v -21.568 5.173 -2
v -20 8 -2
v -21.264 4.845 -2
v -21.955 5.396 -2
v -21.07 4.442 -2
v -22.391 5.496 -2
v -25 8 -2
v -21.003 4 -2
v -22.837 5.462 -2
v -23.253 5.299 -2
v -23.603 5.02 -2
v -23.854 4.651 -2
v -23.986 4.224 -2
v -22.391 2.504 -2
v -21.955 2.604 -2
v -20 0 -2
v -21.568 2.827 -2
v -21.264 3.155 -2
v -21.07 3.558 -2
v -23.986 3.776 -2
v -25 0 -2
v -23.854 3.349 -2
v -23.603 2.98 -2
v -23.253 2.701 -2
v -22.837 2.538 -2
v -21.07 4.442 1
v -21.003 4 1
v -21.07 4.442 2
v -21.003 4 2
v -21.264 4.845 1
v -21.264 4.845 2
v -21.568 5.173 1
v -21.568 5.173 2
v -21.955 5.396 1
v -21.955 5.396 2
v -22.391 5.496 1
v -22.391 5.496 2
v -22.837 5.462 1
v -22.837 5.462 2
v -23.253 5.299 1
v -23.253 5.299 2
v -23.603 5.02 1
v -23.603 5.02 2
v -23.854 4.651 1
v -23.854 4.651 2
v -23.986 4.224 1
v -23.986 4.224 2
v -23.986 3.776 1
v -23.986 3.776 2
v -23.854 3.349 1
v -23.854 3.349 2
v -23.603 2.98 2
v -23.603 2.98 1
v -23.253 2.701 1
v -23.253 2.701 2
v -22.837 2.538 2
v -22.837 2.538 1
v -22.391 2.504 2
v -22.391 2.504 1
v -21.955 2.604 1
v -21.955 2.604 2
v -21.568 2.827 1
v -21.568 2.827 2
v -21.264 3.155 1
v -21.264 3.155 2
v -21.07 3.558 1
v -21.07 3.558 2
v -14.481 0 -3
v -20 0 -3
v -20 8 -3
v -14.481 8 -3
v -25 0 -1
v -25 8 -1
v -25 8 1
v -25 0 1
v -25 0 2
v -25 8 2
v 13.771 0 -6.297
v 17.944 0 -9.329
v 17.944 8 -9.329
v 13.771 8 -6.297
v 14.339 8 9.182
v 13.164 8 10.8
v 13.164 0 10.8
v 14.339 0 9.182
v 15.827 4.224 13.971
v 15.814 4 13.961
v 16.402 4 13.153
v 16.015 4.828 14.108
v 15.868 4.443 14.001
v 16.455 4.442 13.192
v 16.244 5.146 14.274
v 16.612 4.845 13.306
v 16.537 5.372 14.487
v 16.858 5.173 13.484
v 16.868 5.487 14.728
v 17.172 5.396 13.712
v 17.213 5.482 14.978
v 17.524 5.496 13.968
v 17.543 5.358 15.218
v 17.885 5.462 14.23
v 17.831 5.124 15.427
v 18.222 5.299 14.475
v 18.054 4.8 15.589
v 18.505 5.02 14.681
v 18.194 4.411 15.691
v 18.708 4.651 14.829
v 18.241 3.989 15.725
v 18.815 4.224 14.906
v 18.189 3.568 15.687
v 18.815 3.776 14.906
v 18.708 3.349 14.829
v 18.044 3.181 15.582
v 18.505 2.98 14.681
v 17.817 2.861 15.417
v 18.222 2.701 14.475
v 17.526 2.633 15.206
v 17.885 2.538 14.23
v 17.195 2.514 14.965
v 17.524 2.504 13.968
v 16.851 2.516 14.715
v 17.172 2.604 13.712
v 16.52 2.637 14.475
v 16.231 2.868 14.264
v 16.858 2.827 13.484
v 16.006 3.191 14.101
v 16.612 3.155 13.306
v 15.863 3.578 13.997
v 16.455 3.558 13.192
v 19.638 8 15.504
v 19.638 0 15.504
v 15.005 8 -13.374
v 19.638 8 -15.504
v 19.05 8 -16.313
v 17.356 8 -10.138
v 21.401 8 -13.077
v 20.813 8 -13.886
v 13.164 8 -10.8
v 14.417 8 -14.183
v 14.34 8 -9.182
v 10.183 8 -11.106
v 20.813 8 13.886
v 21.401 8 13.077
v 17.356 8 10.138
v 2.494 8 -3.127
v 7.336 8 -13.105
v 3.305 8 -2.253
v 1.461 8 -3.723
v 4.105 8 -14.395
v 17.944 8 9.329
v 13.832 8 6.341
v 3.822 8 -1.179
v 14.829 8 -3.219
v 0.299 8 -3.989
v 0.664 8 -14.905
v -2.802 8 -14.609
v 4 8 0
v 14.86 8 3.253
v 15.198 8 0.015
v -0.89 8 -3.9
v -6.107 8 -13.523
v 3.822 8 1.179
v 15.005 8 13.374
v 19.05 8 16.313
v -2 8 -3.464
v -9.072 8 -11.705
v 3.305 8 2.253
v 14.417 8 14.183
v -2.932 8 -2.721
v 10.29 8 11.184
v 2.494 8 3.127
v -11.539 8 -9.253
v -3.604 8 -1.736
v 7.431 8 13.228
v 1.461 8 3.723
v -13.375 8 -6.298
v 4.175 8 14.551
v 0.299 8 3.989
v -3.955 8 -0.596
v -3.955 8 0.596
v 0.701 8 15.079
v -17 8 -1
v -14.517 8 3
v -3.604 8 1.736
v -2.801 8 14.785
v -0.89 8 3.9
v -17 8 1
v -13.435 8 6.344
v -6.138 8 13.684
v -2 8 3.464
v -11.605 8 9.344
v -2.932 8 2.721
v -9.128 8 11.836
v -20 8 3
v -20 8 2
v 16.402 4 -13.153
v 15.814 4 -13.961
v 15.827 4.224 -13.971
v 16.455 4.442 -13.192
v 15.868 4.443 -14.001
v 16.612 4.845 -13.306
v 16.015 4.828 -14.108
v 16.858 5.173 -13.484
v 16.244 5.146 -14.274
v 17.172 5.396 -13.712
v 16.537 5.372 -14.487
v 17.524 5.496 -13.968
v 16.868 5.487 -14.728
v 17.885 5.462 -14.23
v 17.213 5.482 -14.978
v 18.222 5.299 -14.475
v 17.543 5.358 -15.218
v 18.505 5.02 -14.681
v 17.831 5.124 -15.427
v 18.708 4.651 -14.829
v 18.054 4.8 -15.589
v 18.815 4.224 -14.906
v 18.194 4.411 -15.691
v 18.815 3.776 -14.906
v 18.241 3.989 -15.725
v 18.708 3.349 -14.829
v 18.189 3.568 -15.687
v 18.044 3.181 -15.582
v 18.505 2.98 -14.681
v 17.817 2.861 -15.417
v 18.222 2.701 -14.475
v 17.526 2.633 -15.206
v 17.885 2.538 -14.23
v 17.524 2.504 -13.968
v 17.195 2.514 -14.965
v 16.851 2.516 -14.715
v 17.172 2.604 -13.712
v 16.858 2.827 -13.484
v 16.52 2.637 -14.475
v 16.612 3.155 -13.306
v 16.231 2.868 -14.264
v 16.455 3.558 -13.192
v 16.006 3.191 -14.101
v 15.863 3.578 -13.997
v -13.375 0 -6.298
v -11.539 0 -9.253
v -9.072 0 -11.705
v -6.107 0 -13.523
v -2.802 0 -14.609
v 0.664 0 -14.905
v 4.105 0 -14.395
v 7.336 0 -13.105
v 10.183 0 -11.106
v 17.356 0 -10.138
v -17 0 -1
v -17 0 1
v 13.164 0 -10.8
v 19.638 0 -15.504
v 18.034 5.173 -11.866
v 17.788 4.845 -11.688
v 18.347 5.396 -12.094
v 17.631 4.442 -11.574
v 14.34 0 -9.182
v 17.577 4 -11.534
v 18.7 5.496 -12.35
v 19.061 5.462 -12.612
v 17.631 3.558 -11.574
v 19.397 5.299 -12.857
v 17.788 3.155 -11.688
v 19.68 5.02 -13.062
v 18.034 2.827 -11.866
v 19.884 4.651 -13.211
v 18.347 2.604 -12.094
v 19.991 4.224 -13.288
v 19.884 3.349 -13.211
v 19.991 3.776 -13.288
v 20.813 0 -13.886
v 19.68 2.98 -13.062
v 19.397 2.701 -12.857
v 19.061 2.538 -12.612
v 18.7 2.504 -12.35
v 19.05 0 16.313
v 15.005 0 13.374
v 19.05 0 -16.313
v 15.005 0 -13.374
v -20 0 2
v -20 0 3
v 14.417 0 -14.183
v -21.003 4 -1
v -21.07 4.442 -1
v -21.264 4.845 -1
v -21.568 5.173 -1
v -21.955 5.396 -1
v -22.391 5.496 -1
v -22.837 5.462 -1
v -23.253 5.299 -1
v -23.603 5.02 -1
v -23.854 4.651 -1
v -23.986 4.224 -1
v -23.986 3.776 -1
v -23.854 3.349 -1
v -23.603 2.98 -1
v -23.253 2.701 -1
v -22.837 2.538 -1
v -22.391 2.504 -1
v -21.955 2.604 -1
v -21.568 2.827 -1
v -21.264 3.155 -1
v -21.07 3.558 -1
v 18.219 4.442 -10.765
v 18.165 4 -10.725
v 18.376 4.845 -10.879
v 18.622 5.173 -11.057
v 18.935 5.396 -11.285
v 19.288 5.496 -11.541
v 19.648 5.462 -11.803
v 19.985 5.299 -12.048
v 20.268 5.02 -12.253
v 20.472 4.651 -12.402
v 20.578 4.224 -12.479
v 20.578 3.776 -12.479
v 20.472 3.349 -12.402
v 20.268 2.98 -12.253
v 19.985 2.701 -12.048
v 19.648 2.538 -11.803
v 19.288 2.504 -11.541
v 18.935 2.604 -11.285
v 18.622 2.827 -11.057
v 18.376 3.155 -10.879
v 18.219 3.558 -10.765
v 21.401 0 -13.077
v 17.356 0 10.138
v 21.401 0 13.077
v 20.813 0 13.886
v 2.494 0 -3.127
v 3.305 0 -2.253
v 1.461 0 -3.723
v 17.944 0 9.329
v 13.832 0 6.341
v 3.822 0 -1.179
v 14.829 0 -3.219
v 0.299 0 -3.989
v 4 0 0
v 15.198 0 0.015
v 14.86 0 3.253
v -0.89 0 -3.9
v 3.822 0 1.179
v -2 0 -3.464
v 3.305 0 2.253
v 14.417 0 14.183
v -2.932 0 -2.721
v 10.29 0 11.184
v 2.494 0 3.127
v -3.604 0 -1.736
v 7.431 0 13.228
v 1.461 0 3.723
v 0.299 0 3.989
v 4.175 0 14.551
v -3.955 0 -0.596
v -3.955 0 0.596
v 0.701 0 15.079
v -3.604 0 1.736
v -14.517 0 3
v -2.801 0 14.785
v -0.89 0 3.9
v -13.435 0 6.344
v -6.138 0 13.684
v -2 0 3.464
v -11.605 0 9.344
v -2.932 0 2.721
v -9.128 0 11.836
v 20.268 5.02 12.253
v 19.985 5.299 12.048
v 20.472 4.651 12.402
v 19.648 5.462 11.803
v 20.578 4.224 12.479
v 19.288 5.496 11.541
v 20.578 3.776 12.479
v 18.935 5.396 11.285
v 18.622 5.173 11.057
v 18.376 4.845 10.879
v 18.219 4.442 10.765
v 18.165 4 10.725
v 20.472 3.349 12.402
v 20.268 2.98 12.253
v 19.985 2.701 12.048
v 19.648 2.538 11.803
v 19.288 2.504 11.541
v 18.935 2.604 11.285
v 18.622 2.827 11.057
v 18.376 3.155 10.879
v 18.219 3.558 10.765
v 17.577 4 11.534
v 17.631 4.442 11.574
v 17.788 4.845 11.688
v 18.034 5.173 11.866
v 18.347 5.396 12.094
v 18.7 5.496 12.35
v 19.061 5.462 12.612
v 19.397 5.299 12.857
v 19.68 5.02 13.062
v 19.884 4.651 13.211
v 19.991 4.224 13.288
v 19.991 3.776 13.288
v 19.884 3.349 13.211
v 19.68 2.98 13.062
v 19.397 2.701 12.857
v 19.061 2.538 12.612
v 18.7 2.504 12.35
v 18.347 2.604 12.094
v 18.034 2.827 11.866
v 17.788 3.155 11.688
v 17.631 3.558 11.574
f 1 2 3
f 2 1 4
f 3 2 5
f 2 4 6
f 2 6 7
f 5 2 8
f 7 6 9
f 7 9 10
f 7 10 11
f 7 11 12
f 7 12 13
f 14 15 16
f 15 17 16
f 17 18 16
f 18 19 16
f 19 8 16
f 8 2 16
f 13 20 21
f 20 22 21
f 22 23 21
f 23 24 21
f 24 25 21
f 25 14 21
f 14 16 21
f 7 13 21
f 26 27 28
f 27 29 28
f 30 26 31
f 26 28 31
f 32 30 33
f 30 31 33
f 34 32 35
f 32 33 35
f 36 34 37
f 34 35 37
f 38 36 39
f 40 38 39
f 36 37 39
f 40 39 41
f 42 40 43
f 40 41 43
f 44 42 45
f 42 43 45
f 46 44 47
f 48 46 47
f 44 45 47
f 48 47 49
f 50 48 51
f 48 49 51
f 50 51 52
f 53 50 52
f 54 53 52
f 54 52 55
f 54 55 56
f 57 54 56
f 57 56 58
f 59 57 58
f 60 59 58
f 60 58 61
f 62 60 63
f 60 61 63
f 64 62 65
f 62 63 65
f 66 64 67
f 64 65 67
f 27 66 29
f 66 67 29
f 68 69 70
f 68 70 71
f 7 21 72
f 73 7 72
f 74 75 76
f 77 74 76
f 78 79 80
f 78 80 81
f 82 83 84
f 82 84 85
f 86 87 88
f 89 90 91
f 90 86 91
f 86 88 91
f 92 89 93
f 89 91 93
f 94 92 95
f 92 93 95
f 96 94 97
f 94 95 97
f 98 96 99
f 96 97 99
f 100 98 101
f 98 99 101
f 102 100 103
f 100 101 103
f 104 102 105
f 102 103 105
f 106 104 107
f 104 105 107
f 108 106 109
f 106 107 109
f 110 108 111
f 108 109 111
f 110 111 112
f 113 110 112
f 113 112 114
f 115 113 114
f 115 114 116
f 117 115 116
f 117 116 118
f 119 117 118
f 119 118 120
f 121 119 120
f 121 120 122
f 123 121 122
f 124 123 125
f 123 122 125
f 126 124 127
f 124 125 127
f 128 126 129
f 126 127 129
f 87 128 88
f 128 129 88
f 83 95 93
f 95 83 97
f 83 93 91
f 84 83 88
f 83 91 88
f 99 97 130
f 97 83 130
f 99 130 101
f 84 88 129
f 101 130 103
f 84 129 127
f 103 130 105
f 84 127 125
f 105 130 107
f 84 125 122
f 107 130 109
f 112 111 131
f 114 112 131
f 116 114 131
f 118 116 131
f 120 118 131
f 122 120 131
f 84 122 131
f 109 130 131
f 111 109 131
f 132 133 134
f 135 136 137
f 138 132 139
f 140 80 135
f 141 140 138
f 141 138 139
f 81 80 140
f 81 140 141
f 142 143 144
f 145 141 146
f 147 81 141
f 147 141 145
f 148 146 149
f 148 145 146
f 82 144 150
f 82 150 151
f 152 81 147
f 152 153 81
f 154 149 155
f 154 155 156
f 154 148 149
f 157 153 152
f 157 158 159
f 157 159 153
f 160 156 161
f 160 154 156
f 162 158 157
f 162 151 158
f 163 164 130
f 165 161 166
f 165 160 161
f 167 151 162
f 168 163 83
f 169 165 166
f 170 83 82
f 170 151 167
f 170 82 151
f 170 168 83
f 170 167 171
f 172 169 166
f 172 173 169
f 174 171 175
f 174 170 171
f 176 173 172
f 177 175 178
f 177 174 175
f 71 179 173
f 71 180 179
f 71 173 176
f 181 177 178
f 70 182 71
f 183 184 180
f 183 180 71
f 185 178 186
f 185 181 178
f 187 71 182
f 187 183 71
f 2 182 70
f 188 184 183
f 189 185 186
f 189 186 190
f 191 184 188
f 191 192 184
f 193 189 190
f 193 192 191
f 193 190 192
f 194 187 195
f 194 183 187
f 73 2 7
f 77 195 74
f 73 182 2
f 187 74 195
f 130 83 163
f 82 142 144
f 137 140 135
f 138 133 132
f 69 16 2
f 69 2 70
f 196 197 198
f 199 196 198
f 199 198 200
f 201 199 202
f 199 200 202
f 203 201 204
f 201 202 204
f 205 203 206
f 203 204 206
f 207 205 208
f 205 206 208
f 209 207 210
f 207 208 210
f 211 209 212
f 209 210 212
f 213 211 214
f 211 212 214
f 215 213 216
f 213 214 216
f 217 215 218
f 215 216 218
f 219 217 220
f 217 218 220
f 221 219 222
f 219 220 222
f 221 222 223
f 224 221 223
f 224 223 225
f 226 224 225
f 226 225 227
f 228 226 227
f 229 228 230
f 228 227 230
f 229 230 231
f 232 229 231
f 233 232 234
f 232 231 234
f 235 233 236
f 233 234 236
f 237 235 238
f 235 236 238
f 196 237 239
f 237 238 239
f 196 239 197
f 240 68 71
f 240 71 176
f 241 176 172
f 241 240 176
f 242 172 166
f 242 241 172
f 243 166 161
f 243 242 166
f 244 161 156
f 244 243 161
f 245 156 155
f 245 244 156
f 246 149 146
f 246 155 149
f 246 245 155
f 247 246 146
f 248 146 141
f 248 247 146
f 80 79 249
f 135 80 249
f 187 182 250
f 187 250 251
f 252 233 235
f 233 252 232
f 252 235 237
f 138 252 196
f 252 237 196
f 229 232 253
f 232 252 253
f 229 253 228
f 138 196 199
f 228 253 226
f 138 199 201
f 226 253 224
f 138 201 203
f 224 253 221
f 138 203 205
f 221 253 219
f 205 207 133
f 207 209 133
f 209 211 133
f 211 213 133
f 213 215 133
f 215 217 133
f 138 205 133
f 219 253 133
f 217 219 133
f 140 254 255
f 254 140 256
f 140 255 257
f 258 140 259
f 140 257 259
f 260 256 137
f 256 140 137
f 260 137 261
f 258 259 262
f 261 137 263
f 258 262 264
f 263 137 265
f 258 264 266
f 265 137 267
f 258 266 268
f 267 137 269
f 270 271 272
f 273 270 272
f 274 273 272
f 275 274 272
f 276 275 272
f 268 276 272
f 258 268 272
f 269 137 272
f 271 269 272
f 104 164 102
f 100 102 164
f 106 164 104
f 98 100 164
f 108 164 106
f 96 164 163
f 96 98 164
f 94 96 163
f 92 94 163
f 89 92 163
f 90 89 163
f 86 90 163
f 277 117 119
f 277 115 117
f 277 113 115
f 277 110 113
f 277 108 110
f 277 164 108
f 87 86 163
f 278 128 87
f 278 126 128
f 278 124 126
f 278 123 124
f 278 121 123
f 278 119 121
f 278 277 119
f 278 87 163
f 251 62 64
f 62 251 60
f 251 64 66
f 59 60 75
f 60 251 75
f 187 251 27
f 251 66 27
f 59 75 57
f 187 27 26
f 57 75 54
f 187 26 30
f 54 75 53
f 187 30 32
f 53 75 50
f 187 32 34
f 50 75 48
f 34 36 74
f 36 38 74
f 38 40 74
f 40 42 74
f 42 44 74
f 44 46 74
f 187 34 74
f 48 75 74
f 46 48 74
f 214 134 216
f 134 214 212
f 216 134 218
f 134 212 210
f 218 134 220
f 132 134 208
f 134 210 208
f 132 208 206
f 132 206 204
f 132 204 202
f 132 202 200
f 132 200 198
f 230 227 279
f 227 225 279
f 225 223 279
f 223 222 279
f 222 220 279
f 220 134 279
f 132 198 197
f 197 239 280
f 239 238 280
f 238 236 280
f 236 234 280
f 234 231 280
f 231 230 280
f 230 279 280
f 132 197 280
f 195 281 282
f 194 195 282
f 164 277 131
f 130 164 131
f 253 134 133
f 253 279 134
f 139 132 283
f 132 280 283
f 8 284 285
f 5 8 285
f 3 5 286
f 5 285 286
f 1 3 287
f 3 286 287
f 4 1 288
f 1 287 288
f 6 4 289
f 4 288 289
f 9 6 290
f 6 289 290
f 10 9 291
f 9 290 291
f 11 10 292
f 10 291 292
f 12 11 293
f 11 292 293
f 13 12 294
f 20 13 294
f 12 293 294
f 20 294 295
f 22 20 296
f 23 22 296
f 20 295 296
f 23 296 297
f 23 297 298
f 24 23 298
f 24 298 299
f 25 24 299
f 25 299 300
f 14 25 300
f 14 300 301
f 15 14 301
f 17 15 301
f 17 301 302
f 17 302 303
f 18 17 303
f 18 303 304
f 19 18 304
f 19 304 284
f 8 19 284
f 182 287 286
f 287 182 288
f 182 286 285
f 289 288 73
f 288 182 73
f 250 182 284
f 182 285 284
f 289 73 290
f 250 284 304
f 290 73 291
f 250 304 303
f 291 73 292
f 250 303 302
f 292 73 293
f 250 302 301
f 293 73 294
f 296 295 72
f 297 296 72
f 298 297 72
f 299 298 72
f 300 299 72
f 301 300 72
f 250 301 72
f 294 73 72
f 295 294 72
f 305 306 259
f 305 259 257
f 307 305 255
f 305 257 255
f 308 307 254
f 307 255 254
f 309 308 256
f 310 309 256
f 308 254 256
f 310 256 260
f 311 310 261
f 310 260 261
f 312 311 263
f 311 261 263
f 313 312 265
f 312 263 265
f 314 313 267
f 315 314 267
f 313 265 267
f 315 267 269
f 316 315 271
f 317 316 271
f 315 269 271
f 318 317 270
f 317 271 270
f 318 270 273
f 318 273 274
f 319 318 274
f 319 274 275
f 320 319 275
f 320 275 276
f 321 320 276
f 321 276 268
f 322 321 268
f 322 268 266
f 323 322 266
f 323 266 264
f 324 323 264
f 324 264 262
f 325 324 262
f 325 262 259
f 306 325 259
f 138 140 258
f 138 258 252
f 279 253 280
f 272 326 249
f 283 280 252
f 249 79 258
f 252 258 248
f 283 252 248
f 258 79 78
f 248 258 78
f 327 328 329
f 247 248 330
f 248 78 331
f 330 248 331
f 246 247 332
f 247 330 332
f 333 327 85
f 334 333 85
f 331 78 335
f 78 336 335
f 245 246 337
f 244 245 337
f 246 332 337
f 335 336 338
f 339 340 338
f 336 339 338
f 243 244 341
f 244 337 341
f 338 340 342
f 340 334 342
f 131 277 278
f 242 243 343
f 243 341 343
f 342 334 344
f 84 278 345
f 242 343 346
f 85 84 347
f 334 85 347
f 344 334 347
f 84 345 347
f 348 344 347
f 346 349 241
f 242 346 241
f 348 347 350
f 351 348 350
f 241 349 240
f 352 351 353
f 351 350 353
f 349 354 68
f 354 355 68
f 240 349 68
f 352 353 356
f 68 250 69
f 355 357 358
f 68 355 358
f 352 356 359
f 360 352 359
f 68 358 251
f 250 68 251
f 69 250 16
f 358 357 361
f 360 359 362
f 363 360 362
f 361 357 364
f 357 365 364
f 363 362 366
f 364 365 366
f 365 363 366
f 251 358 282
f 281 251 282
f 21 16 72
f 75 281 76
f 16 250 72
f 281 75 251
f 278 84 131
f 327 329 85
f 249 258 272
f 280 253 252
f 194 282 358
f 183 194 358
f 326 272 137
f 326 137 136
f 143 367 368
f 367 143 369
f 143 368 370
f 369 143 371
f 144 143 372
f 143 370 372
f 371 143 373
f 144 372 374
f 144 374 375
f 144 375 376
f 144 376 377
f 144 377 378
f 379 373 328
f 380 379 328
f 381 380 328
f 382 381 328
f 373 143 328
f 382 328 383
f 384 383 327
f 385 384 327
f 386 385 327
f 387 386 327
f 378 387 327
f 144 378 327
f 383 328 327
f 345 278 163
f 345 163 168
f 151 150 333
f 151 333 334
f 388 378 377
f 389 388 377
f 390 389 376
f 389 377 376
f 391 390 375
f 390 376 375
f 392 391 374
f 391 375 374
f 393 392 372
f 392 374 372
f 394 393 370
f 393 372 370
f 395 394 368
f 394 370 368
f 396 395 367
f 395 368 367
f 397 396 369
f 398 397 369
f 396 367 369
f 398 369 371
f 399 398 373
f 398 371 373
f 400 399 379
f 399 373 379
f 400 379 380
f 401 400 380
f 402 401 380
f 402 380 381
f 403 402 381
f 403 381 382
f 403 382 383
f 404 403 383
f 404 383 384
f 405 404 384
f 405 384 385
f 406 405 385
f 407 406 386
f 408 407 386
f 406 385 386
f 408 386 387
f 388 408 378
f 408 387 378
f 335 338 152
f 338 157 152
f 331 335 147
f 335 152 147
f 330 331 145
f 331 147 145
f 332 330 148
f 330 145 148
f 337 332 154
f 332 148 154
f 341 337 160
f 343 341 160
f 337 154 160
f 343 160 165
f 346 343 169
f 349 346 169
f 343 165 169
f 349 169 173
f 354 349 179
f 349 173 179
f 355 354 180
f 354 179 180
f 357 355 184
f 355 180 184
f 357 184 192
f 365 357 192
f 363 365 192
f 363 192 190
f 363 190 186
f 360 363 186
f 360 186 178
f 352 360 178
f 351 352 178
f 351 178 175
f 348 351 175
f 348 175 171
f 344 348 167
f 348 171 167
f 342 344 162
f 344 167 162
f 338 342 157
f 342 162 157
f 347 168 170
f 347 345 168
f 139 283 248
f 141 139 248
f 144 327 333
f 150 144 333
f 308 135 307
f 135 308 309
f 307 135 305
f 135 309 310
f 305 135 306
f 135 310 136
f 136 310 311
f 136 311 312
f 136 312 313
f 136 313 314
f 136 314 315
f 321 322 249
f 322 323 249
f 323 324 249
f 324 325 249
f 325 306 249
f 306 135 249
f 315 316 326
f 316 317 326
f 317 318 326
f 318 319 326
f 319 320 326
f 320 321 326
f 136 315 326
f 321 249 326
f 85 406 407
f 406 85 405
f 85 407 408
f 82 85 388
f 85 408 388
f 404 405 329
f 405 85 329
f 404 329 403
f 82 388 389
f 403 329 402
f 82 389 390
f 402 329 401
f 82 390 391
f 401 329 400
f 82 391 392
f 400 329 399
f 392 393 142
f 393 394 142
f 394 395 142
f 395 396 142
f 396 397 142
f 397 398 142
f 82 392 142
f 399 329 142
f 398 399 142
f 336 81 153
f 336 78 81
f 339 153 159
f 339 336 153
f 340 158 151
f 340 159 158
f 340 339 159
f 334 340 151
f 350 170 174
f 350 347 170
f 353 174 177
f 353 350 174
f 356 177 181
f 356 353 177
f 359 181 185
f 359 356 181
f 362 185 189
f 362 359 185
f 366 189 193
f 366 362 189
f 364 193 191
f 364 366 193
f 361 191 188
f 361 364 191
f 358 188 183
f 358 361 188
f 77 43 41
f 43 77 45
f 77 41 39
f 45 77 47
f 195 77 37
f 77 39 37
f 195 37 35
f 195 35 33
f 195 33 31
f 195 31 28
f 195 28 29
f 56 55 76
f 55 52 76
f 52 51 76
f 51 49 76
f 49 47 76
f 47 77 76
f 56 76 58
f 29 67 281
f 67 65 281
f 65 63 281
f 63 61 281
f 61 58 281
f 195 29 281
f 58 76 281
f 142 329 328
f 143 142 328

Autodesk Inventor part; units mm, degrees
ref_plane "YZ Plane" through (0, 0, 0) normal (1, 0, 0) x (0, 1, 0)
ref_plane "XZ Plane" through (0, 0, 0) normal (0, 1, 0) x (-1, 0, 0)
ref_plane "XY Plane" through (0, 0, 0) normal (0, 0, 1) x (1, 0, 0)
sketch "Sketch1" plane through (0, 0, 0) normal (0, 1, 0) x (-1, 0, 0)
  circle A0 centre (-0.1978, 0.0875) radius 15
  line L0 (0, 0) -> (25, 0)
  line L1 (0, 0) -> (-20.2254, -14.6946)
  line L2 (0, 0) -> (25, 0) construction
  line L3 (0, 0) -> (-20.2254, 14.6946)
  line L4 (0, 0) -> (25, 0) construction
  line L5 (25, 0) -> (14.5167, 0)
  line L6 (25, 0) -> (14.481, 0)
  line L7 (25, 2) -> (20, 2)
  line L8 (20, 2) -> (20, -2)
  line L9 (20, -2) -> (25, -2)
  line L10 (20, -2) -> (20, -3)
  line L11 (20, 2) -> (20, 3)
  line L12 (25, -2) -> (25, 2)
  line L13 (20, 3) -> (14.5167, 3)
  line L14 (20, -3) -> (14.481, -3)
  line L15 (-21.401, 13.0766) -> (-17.3559, 10.1377)
  line L16 (-17.3559, 10.1377) -> (-17.9437, 9.3287)
  line L17 (-19.0499, 16.3127) -> (-15.0048, 13.3737)
  line L18 (-15.0048, 13.3737) -> (-14.417, 14.1828)
  line L19 (-19.0499, 16.3127) -> (-21.401, 13.0766)
  line L20 (-17.9437, 9.3287) -> (-13.832, 6.3413)
  line L21 (-14.417, 14.1828) -> (-10.2902, 11.1845)
  line L22 (-19.0499, -16.3127) -> (-15.0048, -13.3737)
  line L23 (-15.0048, -13.3737) -> (-14.417, -14.1828)
  line L24 (-17.9437, -9.3287) -> (-17.3559, -10.1377)
  line L25 (-17.3559, -10.1377) -> (-21.401, -13.0766)
  line L26 (-19.0499, -16.3127) -> (-21.401, -13.0766)
  line L27 (-14.417, -14.1828) -> (-10.1826, -11.1063)
  line L28 (-17.9437, -9.3287) -> (-13.7712, -6.2971)
  line L29 (-17.9437, -9.3287) -> (-12.7862, -9.3287) construction
  point P0 (22.9129, 10)
  point P1 (-9.5074, 11.849)
  point P2 (-14.229, 5.3909)
  point P3 (-14.2604, -5.1319)
  point P4 (-9.5775, -11.6181)
  point P5 (14.2709, 4.0444)
  point P6 (14.247, -3.9556)
  dimension "d87" = 25
  dimension "d88" = 25
  dimension "d89" = 144
  dimension "d90" = 25
  dimension "d91" = 144
  dimension "d146" = 5
  dimension "d147" = 4
  dimension "d149" = 5
  dimension "d151" = 5
  dimension "d153" = 5
  dimension "d154" = 1
  dimension "d155" = 36
extrude "Extrusion1" add sketch "Sketch1" along normal blind 8
sketch "Sketch8" plane through (0, 8, 0) normal (0, 1, 0) x (1, 0, 0)
  circle A0 centre (0, 0) radius 4
  dimension "d80" = 8
extrude "Extrusion8" cut sketch "Sketch8" against normal blind 10
sketch "Sketch28" plane through (19.0499, 0, -16.3127) normal (0.809, 0, -0.5878) x (-0.5878, 0, -0.809)
  line L0 (-4, 8) -> (0, 8) projected
  line L1 (-2, 8) -> (-2, 0)
  line L2 (-2, 0) -> (-1, 0)
  line L3 (-4, 0) -> (0, 0) projected
  line L4 (-1, 0) -> (-1, 8)
  line L5 (-1, 8) -> (-3, 8)
  line L6 (-3, 8) -> (-3, 0)
  line L7 (-3, 0) -> (-1, 0)
  point P0 (-3, 8)
  point P1 (-3, 0)
  point P2 (-1, 8)
  dimension "d156" = 1
  dimension "d157" = 2
extrude "Extrusion26" cut sketch "Sketch28" against normal blind 8
sketch "Sketch29" plane through (21.401, 0, 13.0766) normal (0.809, 0, 0.5878) x (0.5878, 0, -0.809)
  line L0 (-4, 8) -> (0, 8) projected
  line L1 (-2, 0) -> (-1, 0)
  line L2 (-1, 0) -> (-1, 8)
  line L3 (-1, 8) -> (-2, 8)
  line L4 (-2, 8) -> (-2, 0)
  line L5 (-4, 0) -> (0, 0) projected
  line L6 (-1, 8) -> (-3, 8)
  line L7 (-3, 8) -> (-3, 0)
  line L8 (-3, 0) -> (-1, 0)
  line L9 (-1, 0) -> (-1, 8)
  point P0 (-3, 8)
  dimension "d160" = 1
  dimension "d161" = 2
extrude "Extrusion27" cut sketch "Sketch29" against normal blind 8
sketch "Sketch30" plane through (-25, 0, -2) normal (-1, 0, 0) x (0, 0, 1)
  line L0 (8.3413, 8) -> (-4.2971, 8) projected
  line L1 (2, 0) -> (3, 0)
  line L2 (3, 0) -> (3, 8)
  line L3 (3, 8) -> (2, 8)
  line L4 (2, 8) -> (2, 0)
  line L5 (8.3413, 0) -> (-4.2971, 0) projected
  line L6 (2, 8) -> (1, 8)
  line L7 (1, 8) -> (1, 0)
  line L8 (1, 0) -> (2, 0)
  line L9 (2, 0) -> (2, 8)
  dimension "d164" = 1
  dimension "d165" = 1
extrude "Extrusion28" cut sketch "Sketch30" against normal blind 8
sketch "Sketch31" plane through (-25, 0, 2) normal (0, 0, 1) x (1, 0, 0)
  line L0 (5, 8) -> (0, 8) projected
  line L1 (0, 8) -> (4.994, 0)
  line L2 (0, 0) -> (8, 0) projected
  circle A0 centre (2.497, 4) radius 1.5
  point P0 (25, 0)
  dimension "d168" = 3
sketch "Sketch32" plane through (17.3559, 0, 10.1377) normal (0.5878, 0, -0.809) x (-0.809, 0, -0.5878)
  line L0 (-5, 0) -> (0, 0) projected
  line L1 (3, 8) -> (-5, 8) projected
  line L2 (0, 0) -> (-5, 8)
  circle A0 centre (-2.5, 4) radius 1.5
  point P0 (20, 0)
  dimension "d169" = 3
sketch "Sketch33" plane through (15.0048, 0, -13.3737) normal (-0.5878, 0, -0.809) x (-0.809, 0, 0.5878)
  line L0 (-5, 8) -> (0, 8) projected
  line L1 (0, 0) -> (0, 8) projected
  line L2 (-5, 8) -> (0, 0)
  circle A0 centre (-2.5, 4) radius 1.5
  point P0 (20, 0)
  dimension "d170" = 3
extrude "Extrusion29" cut sketch "Sketch33" against normal blind 8 contours A0 L2 | L2 A0
extrude "Extrusion30" cut sketch "Sketch32" against normal blind 8
extrude "Extrusion31" cut sketch "Sketch31" against normal blind 8
properties part number "actuatorLink"
